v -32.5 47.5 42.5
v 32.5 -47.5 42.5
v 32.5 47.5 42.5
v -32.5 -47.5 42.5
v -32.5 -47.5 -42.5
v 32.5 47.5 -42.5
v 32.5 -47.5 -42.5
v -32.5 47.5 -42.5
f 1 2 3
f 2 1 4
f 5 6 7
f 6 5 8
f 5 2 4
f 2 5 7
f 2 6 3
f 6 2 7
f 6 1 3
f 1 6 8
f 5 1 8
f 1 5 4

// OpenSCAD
// ========================================
// a 65 x 95 x 85 mm box
// NeuroCAD canonical IR; dimensions are millimetres
// ========================================
$fn = 48;

cube(size=[65, 95, 85], center=true);
